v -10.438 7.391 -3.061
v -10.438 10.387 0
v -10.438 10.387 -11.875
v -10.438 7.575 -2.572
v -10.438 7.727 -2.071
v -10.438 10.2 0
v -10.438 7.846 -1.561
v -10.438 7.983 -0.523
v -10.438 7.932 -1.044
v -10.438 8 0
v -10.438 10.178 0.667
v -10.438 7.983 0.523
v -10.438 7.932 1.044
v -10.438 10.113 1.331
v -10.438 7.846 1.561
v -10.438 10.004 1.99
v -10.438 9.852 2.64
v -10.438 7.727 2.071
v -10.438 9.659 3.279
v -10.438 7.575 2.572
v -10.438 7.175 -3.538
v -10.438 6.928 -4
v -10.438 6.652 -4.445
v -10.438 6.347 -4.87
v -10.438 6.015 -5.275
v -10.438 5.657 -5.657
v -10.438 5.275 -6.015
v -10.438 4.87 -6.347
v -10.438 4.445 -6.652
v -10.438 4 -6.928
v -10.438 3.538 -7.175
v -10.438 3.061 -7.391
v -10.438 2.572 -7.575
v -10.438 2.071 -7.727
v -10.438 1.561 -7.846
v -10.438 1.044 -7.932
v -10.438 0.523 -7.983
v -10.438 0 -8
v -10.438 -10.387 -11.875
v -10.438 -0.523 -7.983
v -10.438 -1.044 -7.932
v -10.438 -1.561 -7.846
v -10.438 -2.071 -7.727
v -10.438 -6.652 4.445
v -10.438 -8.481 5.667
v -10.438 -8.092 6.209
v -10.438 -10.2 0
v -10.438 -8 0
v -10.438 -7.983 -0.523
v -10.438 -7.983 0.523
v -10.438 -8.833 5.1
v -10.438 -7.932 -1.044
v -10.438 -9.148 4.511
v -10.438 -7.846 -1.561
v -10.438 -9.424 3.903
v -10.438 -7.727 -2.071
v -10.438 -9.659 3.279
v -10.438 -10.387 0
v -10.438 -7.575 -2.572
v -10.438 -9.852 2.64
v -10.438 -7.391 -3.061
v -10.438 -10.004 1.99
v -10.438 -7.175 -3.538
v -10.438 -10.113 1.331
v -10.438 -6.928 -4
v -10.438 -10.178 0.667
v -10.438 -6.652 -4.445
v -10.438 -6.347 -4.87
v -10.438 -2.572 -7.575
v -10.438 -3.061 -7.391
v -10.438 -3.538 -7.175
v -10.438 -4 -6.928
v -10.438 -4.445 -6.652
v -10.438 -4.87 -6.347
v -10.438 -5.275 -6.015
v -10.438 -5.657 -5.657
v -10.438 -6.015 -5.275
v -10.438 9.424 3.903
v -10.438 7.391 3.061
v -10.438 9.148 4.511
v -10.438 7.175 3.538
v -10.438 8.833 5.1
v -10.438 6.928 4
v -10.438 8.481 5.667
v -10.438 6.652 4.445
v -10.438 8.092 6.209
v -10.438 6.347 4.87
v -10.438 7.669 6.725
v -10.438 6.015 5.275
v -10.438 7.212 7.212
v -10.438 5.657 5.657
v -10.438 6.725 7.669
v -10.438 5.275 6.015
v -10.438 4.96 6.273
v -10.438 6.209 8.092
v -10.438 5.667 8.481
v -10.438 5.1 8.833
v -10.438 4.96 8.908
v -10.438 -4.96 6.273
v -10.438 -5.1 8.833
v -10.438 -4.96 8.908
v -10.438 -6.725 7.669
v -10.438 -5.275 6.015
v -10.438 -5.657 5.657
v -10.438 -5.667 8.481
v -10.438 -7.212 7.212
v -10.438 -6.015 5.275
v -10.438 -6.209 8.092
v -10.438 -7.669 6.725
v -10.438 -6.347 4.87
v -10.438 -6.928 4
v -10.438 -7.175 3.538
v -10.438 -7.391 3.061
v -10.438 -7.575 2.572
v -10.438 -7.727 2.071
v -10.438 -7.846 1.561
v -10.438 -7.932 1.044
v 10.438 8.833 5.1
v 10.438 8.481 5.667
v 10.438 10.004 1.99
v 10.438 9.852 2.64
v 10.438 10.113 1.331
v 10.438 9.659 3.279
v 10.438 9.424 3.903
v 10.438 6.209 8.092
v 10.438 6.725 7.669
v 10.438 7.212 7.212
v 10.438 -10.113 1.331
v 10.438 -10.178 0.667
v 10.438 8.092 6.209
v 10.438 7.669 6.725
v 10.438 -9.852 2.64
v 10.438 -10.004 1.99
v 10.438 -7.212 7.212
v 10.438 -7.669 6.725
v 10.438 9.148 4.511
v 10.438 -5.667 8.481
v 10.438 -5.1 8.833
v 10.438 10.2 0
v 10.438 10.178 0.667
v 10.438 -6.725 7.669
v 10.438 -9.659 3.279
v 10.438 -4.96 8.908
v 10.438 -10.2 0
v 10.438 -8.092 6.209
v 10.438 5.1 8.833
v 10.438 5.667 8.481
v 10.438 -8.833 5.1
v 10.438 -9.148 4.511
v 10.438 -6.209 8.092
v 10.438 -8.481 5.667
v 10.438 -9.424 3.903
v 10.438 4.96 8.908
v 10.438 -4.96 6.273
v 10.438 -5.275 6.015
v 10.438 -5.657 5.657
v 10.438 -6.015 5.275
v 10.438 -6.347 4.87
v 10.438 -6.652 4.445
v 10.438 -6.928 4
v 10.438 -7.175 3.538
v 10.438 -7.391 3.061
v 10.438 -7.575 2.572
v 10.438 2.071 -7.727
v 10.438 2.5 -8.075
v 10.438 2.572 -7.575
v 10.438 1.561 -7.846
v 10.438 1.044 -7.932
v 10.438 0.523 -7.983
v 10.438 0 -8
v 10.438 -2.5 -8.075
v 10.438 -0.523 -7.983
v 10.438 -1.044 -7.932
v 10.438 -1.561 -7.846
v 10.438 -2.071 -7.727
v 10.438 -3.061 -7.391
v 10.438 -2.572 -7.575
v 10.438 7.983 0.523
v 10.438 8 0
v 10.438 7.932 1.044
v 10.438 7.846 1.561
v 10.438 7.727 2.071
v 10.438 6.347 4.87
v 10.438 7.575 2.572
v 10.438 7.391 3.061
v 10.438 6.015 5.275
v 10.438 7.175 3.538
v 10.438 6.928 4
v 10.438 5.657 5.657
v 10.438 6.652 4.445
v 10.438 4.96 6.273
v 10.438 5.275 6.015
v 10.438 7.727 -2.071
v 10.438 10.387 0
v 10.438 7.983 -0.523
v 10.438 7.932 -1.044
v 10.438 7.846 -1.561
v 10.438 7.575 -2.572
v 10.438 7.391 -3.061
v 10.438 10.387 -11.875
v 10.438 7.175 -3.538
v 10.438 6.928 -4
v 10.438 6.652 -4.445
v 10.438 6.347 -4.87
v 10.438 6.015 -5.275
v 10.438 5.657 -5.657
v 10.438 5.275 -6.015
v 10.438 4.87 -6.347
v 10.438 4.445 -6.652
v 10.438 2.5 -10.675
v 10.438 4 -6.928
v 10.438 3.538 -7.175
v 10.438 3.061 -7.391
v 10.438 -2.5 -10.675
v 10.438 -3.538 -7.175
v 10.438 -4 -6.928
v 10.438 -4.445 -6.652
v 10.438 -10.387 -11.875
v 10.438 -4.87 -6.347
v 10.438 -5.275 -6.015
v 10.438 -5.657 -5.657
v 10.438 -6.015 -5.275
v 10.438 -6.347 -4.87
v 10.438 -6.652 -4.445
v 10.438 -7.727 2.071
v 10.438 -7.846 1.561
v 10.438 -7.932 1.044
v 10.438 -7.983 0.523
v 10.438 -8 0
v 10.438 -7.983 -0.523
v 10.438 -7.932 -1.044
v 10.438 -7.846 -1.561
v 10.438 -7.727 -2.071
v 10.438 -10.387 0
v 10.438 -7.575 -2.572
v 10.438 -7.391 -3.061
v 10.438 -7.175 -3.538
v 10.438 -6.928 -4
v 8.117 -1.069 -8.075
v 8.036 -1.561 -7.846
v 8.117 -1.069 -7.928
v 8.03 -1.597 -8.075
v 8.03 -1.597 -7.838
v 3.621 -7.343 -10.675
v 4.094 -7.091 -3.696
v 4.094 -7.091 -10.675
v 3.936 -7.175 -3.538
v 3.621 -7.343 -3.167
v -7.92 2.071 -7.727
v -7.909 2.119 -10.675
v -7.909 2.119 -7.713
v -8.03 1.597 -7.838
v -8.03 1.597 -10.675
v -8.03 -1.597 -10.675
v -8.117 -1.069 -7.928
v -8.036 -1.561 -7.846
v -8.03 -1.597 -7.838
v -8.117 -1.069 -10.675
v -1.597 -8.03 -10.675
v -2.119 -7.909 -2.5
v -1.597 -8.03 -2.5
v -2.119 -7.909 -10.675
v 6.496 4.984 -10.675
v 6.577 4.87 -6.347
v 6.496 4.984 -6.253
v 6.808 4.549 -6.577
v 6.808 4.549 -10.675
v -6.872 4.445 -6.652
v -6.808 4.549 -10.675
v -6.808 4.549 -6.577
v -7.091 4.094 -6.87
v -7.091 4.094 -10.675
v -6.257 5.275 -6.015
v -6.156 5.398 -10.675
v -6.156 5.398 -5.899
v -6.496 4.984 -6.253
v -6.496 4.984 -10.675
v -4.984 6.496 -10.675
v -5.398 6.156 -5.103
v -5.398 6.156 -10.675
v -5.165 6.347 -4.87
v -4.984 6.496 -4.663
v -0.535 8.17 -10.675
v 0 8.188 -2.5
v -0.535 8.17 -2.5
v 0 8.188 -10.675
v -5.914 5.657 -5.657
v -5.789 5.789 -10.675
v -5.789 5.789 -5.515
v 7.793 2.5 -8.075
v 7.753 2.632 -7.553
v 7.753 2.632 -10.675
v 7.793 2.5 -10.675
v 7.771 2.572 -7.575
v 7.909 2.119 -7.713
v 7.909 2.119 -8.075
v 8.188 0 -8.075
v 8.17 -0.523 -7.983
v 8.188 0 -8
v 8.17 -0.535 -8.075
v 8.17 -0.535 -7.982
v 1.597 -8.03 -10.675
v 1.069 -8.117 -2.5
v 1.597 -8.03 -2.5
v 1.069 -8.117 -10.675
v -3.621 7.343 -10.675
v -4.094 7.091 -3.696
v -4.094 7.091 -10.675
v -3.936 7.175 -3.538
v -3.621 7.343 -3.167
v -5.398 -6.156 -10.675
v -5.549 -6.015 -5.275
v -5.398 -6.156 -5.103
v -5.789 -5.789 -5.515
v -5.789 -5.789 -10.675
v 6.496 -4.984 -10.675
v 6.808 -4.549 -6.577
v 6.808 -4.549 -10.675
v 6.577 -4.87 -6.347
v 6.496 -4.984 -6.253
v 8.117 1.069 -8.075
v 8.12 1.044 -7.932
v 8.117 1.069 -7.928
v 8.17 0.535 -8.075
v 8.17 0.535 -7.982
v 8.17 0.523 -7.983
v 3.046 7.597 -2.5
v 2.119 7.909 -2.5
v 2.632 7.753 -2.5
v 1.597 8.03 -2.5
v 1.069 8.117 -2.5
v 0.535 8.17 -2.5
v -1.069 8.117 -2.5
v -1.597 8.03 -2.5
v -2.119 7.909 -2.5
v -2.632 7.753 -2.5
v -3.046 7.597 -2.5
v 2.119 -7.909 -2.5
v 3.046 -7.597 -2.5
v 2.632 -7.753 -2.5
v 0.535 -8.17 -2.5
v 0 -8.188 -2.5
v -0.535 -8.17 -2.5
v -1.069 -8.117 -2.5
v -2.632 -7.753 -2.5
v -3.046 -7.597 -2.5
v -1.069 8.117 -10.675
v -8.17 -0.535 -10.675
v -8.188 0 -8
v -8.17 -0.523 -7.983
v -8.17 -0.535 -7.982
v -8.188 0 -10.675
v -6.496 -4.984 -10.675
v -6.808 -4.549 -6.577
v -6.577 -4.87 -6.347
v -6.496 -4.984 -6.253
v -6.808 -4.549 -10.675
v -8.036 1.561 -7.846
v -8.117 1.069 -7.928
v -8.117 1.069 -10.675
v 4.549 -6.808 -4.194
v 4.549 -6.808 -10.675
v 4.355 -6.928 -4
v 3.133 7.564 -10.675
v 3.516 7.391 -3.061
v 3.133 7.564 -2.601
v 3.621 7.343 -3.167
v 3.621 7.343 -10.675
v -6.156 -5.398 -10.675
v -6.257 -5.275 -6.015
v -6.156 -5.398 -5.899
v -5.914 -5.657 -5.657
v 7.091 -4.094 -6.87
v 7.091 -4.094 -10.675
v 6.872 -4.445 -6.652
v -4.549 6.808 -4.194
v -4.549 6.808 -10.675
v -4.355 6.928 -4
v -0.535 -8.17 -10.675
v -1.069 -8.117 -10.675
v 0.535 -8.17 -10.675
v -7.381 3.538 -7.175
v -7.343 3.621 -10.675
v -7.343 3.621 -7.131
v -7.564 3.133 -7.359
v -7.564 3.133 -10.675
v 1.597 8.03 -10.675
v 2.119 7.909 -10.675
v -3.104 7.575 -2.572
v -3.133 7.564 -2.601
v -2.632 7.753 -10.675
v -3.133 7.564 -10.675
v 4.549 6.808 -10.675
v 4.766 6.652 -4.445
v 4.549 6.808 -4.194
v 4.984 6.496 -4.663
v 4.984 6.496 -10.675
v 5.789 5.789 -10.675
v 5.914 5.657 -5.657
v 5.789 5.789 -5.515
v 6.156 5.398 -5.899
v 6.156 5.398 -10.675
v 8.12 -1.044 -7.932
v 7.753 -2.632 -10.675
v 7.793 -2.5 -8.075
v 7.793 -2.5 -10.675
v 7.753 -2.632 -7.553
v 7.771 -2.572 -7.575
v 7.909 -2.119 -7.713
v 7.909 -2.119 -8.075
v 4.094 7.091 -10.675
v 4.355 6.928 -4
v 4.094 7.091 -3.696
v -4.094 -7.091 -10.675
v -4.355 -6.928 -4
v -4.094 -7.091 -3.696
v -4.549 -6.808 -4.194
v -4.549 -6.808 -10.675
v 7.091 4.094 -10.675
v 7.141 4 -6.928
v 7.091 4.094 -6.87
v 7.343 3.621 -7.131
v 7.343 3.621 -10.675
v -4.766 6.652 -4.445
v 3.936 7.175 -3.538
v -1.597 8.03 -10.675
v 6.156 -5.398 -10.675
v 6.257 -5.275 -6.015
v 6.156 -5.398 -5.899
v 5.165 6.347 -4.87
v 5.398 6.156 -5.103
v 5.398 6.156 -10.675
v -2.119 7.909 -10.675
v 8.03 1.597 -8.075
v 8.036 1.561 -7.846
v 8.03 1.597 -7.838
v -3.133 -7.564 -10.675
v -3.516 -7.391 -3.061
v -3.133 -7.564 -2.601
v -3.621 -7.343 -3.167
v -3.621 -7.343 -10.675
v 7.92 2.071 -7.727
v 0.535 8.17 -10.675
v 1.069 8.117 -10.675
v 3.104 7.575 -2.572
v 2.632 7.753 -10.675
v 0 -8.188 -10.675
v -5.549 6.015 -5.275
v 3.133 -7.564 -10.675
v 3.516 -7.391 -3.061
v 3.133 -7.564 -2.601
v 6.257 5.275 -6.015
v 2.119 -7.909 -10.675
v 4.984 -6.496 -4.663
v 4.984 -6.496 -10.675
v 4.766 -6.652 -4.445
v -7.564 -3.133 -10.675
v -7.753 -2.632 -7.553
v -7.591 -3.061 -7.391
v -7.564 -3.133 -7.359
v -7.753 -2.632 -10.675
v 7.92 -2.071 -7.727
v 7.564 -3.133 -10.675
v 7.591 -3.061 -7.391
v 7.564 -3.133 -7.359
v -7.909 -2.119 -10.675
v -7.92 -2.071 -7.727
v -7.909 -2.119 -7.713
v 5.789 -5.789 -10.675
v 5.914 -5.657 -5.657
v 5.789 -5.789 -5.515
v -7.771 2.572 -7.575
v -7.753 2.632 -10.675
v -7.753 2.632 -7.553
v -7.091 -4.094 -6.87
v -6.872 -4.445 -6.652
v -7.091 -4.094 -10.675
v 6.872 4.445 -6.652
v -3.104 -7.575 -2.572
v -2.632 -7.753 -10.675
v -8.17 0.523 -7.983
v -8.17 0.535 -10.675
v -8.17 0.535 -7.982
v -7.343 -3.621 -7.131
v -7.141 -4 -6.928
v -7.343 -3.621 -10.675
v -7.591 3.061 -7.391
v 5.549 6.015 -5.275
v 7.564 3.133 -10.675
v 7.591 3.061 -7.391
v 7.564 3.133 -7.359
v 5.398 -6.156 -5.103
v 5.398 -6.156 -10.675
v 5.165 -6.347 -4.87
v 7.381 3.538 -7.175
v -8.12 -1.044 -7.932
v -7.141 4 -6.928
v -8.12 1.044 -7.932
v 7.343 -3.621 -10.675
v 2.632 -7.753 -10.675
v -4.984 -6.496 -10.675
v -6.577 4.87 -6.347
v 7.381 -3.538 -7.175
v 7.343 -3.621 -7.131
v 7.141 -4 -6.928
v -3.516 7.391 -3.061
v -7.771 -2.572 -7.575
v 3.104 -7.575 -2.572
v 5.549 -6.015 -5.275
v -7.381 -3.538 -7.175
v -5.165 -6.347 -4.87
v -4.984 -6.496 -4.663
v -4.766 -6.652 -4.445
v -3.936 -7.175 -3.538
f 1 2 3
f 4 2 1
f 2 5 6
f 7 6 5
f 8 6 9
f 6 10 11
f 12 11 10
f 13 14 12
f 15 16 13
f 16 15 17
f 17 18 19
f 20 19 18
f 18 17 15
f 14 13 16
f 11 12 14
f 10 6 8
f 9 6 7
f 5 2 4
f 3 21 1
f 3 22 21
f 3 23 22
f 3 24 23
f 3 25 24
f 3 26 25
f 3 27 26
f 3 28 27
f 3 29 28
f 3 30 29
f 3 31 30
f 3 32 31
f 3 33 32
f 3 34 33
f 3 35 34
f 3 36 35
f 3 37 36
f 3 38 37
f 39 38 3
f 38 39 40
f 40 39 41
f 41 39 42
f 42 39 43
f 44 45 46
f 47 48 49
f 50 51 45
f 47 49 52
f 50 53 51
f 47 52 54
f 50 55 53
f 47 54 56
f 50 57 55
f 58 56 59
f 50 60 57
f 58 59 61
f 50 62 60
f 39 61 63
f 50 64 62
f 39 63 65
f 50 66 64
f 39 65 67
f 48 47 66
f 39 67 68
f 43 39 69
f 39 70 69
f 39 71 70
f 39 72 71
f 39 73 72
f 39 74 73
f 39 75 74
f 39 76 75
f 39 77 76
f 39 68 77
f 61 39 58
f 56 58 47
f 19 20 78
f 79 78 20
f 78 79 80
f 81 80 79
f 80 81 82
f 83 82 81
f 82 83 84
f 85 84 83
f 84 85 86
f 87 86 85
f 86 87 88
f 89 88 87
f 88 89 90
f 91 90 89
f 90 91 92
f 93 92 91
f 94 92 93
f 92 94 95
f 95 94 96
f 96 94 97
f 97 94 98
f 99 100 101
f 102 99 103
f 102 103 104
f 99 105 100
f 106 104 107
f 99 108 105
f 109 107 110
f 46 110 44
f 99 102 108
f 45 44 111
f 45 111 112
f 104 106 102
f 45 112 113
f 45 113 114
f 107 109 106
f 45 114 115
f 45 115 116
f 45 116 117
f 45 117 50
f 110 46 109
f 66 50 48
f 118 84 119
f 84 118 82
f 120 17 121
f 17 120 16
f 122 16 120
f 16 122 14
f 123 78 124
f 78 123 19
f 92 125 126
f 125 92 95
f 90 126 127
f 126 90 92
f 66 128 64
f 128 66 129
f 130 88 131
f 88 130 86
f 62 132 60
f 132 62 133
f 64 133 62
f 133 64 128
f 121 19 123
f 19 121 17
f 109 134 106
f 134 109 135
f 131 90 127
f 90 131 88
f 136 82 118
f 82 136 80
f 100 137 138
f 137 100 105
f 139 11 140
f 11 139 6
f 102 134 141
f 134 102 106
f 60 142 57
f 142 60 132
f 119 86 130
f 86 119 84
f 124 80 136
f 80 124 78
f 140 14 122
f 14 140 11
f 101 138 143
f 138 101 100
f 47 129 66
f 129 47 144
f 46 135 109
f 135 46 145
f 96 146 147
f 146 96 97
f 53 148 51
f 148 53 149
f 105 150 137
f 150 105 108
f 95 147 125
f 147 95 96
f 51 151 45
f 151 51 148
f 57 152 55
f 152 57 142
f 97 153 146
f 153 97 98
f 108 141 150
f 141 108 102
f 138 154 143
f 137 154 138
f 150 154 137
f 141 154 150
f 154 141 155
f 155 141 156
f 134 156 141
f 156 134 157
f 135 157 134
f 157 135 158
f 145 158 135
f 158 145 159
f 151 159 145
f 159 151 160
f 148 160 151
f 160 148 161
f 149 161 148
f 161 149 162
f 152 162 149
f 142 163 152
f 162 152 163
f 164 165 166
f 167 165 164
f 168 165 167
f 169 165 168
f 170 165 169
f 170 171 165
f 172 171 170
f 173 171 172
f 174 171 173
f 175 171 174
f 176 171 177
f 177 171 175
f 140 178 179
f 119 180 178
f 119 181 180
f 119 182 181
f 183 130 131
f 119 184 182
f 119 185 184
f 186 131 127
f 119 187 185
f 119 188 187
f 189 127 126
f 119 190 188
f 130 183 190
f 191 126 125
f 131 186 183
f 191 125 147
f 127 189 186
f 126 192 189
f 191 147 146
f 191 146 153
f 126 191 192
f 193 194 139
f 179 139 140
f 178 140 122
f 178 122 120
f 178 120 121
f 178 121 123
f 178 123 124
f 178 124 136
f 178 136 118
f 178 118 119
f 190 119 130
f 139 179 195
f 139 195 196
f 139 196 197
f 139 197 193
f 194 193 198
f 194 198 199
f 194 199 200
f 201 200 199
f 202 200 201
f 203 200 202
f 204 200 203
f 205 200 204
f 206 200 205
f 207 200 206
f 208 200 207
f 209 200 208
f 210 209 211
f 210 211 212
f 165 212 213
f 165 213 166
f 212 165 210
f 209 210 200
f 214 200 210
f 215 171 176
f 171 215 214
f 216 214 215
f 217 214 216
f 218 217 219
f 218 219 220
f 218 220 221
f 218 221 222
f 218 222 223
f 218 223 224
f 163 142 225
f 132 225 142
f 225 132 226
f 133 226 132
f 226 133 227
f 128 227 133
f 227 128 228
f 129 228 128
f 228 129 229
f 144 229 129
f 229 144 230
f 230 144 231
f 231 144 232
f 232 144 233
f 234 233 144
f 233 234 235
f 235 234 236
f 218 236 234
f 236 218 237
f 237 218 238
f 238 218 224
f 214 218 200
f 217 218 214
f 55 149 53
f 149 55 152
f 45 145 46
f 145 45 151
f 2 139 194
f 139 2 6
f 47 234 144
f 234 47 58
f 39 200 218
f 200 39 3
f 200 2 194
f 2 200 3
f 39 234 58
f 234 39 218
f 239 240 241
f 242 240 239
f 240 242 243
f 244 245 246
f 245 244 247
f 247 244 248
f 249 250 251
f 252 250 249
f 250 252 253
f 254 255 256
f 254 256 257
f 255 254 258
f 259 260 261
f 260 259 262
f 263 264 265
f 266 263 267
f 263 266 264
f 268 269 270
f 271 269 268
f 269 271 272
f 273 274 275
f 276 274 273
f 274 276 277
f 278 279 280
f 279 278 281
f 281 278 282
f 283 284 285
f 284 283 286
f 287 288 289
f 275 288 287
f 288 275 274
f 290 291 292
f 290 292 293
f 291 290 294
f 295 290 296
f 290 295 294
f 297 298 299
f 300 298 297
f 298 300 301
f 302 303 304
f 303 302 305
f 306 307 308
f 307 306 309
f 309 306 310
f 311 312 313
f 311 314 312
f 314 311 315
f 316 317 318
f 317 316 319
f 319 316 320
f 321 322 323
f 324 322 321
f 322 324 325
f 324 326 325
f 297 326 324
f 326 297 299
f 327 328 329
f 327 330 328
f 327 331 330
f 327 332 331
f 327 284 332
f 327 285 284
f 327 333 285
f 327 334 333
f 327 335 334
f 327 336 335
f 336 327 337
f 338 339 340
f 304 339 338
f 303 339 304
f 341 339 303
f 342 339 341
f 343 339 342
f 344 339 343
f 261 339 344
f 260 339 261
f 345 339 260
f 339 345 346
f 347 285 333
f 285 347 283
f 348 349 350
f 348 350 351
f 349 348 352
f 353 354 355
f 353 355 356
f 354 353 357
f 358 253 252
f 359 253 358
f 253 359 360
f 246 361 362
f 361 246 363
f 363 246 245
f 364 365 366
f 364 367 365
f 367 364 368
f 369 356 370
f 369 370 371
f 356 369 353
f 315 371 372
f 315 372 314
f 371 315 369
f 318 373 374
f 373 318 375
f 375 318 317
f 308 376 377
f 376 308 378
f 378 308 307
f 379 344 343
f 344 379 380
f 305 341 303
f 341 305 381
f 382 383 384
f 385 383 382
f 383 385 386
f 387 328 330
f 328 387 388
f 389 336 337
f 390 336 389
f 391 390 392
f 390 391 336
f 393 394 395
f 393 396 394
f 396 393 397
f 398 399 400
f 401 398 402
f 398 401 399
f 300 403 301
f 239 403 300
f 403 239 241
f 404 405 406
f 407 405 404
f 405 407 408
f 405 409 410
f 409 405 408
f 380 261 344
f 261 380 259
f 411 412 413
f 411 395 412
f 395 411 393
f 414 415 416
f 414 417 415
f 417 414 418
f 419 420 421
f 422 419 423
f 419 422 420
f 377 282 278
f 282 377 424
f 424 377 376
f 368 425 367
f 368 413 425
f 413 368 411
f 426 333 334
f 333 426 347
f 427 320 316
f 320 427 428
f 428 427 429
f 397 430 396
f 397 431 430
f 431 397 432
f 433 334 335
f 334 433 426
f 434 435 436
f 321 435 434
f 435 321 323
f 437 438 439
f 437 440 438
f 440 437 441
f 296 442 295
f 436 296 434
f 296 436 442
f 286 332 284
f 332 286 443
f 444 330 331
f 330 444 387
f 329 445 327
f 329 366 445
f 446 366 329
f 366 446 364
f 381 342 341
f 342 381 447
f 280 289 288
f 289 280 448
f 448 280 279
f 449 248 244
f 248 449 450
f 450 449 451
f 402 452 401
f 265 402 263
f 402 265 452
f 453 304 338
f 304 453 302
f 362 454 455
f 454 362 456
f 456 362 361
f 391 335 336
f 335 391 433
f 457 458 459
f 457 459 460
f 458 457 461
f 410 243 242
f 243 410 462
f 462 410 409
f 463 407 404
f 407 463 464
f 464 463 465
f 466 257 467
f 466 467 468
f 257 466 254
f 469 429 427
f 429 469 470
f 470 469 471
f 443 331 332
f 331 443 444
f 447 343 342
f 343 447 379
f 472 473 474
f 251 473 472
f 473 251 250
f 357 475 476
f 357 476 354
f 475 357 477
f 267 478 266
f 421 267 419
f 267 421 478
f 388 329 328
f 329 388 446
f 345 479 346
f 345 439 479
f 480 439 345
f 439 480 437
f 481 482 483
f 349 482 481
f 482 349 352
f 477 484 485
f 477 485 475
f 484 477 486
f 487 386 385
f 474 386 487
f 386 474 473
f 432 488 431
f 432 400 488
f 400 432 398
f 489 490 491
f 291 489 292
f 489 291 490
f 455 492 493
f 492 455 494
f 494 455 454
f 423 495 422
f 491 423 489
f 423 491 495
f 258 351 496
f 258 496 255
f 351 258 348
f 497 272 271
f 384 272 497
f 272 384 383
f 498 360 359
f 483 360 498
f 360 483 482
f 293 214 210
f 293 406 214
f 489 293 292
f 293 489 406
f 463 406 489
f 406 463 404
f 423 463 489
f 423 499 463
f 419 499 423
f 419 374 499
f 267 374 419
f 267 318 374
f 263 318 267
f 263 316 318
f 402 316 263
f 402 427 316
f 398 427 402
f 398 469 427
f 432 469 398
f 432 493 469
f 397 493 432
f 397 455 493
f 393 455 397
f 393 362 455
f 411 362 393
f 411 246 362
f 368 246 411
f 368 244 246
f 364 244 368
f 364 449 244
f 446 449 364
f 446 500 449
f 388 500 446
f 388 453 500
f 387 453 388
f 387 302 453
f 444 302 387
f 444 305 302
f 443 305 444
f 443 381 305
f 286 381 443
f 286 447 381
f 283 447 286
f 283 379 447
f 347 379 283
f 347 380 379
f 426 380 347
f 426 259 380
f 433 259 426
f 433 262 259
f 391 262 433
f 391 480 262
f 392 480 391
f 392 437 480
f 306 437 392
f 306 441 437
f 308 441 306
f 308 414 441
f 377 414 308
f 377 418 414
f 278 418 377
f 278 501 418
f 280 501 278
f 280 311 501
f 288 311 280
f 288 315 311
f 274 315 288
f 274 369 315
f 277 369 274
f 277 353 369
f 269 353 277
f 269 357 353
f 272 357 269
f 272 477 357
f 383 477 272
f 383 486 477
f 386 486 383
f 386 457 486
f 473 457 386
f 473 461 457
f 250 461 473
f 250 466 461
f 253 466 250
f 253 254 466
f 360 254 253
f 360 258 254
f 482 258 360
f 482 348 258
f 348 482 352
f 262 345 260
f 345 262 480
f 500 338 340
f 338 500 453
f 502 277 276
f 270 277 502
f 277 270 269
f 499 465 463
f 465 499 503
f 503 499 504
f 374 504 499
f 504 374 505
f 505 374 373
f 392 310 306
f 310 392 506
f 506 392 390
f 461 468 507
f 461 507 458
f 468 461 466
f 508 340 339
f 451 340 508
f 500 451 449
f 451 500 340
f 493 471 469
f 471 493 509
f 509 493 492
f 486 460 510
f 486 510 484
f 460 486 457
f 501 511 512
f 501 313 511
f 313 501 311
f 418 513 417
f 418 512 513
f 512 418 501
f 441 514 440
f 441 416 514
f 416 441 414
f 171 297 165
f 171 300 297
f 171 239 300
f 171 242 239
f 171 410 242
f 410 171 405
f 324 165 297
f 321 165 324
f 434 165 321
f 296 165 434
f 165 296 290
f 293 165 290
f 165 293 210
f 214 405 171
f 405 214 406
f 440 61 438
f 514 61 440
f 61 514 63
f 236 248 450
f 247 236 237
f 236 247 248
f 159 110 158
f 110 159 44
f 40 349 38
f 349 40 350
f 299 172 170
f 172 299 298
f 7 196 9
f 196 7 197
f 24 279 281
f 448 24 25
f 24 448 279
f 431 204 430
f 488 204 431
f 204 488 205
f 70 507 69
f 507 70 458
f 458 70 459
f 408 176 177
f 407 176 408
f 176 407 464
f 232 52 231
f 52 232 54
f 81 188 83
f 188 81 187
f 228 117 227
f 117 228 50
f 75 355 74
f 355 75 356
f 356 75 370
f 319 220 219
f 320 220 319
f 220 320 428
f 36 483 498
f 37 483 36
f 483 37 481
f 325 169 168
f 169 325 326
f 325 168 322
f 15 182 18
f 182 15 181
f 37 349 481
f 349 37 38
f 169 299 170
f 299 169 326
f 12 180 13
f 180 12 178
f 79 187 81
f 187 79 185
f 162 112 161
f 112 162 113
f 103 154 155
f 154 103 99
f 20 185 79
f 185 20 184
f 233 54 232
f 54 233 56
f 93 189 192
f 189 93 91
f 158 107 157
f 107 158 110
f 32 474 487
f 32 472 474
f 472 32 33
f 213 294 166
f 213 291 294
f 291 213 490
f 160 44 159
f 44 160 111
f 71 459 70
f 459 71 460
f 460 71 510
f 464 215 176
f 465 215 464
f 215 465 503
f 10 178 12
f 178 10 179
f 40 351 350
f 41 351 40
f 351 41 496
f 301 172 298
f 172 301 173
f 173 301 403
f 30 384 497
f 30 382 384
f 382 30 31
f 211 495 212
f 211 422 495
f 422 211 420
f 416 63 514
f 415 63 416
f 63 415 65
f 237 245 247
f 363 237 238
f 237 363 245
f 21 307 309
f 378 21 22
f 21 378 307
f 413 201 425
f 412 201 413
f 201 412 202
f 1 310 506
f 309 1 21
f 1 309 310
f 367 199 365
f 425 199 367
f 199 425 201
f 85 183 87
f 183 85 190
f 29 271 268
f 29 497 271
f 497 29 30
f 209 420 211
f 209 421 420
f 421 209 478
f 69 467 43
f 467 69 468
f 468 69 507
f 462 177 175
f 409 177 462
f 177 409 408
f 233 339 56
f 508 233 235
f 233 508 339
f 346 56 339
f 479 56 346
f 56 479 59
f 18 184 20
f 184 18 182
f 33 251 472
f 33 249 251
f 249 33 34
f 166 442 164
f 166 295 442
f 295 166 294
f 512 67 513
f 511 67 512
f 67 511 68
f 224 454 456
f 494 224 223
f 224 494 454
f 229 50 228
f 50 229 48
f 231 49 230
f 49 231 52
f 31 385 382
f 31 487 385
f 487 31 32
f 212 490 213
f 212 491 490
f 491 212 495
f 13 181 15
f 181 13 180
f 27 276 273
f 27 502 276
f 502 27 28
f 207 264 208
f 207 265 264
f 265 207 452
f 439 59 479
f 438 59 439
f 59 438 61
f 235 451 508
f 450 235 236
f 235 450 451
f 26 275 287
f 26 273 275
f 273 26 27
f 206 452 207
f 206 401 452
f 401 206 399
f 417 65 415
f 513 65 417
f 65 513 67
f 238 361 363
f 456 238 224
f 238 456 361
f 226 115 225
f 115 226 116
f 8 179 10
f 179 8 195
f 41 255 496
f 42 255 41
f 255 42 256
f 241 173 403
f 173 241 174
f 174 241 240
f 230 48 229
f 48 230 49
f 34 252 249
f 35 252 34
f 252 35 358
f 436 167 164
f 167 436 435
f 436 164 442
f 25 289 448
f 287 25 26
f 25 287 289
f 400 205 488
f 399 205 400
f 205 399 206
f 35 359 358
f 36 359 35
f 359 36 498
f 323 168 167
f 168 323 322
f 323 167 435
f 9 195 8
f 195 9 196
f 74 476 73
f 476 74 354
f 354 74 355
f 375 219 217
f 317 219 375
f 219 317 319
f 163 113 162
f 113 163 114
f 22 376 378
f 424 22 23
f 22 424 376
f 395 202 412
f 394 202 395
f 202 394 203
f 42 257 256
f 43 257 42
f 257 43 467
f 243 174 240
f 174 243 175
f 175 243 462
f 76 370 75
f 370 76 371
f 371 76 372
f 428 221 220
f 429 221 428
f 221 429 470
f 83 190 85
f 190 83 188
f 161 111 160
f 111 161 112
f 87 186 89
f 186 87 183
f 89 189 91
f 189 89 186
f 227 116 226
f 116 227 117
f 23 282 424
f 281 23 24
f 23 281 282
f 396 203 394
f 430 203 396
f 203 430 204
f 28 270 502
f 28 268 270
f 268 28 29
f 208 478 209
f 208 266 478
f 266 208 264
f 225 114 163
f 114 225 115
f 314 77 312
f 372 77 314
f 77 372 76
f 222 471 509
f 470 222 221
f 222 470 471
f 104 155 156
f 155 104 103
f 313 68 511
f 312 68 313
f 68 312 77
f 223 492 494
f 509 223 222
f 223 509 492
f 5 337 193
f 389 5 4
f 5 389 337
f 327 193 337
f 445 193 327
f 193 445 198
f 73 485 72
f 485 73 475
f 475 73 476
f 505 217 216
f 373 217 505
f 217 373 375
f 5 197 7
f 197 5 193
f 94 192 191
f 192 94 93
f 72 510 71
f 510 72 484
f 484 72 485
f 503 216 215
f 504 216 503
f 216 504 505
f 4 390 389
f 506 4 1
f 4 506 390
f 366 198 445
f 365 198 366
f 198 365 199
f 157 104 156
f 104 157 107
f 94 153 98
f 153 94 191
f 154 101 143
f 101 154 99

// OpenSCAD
// PulseSensor fingertip mount — afferent / Junction 2026
//
// Sensor: PulseSensor Amped / SparkFun SEN-11574 and green-LED clones
//   diameter 0.625" = 15.875 mm, overall thickness 0.125" = 3.175 mm (SparkFun spec)
//   LED + light sensor on the front face, cable leaves from the back near the edge.
//
// part = "clip"  : C-shaped fingertip clip, sensor recessed on the pad side
// part = "strap" : sensor cup with two slots for a velcro / elastic strap
//
// Render one STL per size, e.g.
//   openscad -D 'part="clip"' -D finger_d=16 -o clip_M.stl pulse-sensor-mount.scad
//
// Print: PETG or TPU (95A) recommended for the clip so it flexes without cracking.
// PLA works but use a size up. 0.2 mm layers, no supports, flat bottom on the bed
// (as modelled: finger axis along X, C-opening facing up).

part = "clip";          // "clip" | "strap"

// ── sensor ─────────────────────────────────────────────────────────────
sensor_d = 15.875;      // mm
sensor_t = 3.175;       // mm, PCB + components
fit      = 0.25;        // radial clearance; lower (0.1) for a tighter press fit
protrude = 0.5;         // sensor face sticks this far into the finger space = gentle pressure
cable_w  = 5.0;         // cable / header exit width
cable_h  = 2.6;         // cable exit height

// ── clip ───────────────────────────────────────────────────────────────
finger_d = 16;          // fingertip diameter: S 14, M 16, L 18
wall     = 2.2;         // ring wall
length   = sensor_d + 2 * 2.5;   // along the finger
opening  = 0.62;        // C-opening width as a fraction of finger_d (snap-on)
floor_t  = 1.2;         // material behind the sensor

// ── strap holder ───────────────────────────────────────────────────────
strap_w  = 20;          // strap width (10-25 mm velcro)
strap_t  = 2.5;         // strap thickness + clearance

$fn = 96;
pocket_d = sensor_d + 2 * fit;
eps = 0.01;

module sensor_pocket(top_z, cable_dir = 0) {
    // pocket opening at top_z, sensor face ends up `protrude` above top_z
    translate([0, 0, top_z - (sensor_t - protrude)])
        cylinder(d = pocket_d, h = sensor_t + 5);
    // cable channel from the pocket floor outward (cable_dir: 0 = +X, 90 = +Y)
    rotate([0, 0, cable_dir])
        translate([0, -cable_w / 2, top_z - (sensor_t - protrude)])
            cube([40, cable_w, cable_h]);
}

module clip() {
    r = finger_d / 2;
    boss_z = -(r + sensor_t - protrude + floor_t);   // bottom of the sensor boss
    difference() {
        union() {
            // ring around the finger (axis along X)
            rotate([0, 90, 0]) cylinder(r = r + wall, h = length, center = true);
            // solid lower half: flat base + room for the sensor under the pad.
            // Lower half is a block so the clip prints flat with no supports.
            base_w = max(2 * (r + wall), pocket_d + 2 * wall);
            translate([-length / 2, -base_w / 2, boss_z]) cube([length, base_w, -boss_z]);
        }
        // finger
        rotate([0, 90, 0]) cylinder(r = r, h = length + 2, center = true);
        // C-opening on the nail side
        translate([-length, -finger_d * opening / 2, 0]) cube([2 * length, finger_d * opening, r * 2]);
        // sensor, face up toward the finger pad
        sensor_pocket(-r, 0);
        // flat print bed
        translate([-length, -50, boss_z - 50]) cube([2 * length, 100, 50]);
    }
}

module strap() {
    body_d = pocket_d + 2 * 2.0;
    body_h = sensor_t - protrude + floor_t;
    difference() {
        union() {
            cylinder(d = body_d, h = body_h);
            // strap loops on both sides
            for (s = [-1, 1])
                translate([s * (body_d / 2 + strap_t / 2 + 0.5), 0, (body_h + strap_t + 2) / 2 - eps])
                    difference() {
                        cube([strap_t + 3, strap_w + 4, body_h + strap_t + 2], center = true);
                        translate([0, 0, 0]) cube([strap_t, strap_w, body_h + strap_t + 4], center = true);
                    }
        }
        sensor_pocket(body_h, 90);
    }
}

if (part == "clip") clip();
else if (part == "strap") strap();
